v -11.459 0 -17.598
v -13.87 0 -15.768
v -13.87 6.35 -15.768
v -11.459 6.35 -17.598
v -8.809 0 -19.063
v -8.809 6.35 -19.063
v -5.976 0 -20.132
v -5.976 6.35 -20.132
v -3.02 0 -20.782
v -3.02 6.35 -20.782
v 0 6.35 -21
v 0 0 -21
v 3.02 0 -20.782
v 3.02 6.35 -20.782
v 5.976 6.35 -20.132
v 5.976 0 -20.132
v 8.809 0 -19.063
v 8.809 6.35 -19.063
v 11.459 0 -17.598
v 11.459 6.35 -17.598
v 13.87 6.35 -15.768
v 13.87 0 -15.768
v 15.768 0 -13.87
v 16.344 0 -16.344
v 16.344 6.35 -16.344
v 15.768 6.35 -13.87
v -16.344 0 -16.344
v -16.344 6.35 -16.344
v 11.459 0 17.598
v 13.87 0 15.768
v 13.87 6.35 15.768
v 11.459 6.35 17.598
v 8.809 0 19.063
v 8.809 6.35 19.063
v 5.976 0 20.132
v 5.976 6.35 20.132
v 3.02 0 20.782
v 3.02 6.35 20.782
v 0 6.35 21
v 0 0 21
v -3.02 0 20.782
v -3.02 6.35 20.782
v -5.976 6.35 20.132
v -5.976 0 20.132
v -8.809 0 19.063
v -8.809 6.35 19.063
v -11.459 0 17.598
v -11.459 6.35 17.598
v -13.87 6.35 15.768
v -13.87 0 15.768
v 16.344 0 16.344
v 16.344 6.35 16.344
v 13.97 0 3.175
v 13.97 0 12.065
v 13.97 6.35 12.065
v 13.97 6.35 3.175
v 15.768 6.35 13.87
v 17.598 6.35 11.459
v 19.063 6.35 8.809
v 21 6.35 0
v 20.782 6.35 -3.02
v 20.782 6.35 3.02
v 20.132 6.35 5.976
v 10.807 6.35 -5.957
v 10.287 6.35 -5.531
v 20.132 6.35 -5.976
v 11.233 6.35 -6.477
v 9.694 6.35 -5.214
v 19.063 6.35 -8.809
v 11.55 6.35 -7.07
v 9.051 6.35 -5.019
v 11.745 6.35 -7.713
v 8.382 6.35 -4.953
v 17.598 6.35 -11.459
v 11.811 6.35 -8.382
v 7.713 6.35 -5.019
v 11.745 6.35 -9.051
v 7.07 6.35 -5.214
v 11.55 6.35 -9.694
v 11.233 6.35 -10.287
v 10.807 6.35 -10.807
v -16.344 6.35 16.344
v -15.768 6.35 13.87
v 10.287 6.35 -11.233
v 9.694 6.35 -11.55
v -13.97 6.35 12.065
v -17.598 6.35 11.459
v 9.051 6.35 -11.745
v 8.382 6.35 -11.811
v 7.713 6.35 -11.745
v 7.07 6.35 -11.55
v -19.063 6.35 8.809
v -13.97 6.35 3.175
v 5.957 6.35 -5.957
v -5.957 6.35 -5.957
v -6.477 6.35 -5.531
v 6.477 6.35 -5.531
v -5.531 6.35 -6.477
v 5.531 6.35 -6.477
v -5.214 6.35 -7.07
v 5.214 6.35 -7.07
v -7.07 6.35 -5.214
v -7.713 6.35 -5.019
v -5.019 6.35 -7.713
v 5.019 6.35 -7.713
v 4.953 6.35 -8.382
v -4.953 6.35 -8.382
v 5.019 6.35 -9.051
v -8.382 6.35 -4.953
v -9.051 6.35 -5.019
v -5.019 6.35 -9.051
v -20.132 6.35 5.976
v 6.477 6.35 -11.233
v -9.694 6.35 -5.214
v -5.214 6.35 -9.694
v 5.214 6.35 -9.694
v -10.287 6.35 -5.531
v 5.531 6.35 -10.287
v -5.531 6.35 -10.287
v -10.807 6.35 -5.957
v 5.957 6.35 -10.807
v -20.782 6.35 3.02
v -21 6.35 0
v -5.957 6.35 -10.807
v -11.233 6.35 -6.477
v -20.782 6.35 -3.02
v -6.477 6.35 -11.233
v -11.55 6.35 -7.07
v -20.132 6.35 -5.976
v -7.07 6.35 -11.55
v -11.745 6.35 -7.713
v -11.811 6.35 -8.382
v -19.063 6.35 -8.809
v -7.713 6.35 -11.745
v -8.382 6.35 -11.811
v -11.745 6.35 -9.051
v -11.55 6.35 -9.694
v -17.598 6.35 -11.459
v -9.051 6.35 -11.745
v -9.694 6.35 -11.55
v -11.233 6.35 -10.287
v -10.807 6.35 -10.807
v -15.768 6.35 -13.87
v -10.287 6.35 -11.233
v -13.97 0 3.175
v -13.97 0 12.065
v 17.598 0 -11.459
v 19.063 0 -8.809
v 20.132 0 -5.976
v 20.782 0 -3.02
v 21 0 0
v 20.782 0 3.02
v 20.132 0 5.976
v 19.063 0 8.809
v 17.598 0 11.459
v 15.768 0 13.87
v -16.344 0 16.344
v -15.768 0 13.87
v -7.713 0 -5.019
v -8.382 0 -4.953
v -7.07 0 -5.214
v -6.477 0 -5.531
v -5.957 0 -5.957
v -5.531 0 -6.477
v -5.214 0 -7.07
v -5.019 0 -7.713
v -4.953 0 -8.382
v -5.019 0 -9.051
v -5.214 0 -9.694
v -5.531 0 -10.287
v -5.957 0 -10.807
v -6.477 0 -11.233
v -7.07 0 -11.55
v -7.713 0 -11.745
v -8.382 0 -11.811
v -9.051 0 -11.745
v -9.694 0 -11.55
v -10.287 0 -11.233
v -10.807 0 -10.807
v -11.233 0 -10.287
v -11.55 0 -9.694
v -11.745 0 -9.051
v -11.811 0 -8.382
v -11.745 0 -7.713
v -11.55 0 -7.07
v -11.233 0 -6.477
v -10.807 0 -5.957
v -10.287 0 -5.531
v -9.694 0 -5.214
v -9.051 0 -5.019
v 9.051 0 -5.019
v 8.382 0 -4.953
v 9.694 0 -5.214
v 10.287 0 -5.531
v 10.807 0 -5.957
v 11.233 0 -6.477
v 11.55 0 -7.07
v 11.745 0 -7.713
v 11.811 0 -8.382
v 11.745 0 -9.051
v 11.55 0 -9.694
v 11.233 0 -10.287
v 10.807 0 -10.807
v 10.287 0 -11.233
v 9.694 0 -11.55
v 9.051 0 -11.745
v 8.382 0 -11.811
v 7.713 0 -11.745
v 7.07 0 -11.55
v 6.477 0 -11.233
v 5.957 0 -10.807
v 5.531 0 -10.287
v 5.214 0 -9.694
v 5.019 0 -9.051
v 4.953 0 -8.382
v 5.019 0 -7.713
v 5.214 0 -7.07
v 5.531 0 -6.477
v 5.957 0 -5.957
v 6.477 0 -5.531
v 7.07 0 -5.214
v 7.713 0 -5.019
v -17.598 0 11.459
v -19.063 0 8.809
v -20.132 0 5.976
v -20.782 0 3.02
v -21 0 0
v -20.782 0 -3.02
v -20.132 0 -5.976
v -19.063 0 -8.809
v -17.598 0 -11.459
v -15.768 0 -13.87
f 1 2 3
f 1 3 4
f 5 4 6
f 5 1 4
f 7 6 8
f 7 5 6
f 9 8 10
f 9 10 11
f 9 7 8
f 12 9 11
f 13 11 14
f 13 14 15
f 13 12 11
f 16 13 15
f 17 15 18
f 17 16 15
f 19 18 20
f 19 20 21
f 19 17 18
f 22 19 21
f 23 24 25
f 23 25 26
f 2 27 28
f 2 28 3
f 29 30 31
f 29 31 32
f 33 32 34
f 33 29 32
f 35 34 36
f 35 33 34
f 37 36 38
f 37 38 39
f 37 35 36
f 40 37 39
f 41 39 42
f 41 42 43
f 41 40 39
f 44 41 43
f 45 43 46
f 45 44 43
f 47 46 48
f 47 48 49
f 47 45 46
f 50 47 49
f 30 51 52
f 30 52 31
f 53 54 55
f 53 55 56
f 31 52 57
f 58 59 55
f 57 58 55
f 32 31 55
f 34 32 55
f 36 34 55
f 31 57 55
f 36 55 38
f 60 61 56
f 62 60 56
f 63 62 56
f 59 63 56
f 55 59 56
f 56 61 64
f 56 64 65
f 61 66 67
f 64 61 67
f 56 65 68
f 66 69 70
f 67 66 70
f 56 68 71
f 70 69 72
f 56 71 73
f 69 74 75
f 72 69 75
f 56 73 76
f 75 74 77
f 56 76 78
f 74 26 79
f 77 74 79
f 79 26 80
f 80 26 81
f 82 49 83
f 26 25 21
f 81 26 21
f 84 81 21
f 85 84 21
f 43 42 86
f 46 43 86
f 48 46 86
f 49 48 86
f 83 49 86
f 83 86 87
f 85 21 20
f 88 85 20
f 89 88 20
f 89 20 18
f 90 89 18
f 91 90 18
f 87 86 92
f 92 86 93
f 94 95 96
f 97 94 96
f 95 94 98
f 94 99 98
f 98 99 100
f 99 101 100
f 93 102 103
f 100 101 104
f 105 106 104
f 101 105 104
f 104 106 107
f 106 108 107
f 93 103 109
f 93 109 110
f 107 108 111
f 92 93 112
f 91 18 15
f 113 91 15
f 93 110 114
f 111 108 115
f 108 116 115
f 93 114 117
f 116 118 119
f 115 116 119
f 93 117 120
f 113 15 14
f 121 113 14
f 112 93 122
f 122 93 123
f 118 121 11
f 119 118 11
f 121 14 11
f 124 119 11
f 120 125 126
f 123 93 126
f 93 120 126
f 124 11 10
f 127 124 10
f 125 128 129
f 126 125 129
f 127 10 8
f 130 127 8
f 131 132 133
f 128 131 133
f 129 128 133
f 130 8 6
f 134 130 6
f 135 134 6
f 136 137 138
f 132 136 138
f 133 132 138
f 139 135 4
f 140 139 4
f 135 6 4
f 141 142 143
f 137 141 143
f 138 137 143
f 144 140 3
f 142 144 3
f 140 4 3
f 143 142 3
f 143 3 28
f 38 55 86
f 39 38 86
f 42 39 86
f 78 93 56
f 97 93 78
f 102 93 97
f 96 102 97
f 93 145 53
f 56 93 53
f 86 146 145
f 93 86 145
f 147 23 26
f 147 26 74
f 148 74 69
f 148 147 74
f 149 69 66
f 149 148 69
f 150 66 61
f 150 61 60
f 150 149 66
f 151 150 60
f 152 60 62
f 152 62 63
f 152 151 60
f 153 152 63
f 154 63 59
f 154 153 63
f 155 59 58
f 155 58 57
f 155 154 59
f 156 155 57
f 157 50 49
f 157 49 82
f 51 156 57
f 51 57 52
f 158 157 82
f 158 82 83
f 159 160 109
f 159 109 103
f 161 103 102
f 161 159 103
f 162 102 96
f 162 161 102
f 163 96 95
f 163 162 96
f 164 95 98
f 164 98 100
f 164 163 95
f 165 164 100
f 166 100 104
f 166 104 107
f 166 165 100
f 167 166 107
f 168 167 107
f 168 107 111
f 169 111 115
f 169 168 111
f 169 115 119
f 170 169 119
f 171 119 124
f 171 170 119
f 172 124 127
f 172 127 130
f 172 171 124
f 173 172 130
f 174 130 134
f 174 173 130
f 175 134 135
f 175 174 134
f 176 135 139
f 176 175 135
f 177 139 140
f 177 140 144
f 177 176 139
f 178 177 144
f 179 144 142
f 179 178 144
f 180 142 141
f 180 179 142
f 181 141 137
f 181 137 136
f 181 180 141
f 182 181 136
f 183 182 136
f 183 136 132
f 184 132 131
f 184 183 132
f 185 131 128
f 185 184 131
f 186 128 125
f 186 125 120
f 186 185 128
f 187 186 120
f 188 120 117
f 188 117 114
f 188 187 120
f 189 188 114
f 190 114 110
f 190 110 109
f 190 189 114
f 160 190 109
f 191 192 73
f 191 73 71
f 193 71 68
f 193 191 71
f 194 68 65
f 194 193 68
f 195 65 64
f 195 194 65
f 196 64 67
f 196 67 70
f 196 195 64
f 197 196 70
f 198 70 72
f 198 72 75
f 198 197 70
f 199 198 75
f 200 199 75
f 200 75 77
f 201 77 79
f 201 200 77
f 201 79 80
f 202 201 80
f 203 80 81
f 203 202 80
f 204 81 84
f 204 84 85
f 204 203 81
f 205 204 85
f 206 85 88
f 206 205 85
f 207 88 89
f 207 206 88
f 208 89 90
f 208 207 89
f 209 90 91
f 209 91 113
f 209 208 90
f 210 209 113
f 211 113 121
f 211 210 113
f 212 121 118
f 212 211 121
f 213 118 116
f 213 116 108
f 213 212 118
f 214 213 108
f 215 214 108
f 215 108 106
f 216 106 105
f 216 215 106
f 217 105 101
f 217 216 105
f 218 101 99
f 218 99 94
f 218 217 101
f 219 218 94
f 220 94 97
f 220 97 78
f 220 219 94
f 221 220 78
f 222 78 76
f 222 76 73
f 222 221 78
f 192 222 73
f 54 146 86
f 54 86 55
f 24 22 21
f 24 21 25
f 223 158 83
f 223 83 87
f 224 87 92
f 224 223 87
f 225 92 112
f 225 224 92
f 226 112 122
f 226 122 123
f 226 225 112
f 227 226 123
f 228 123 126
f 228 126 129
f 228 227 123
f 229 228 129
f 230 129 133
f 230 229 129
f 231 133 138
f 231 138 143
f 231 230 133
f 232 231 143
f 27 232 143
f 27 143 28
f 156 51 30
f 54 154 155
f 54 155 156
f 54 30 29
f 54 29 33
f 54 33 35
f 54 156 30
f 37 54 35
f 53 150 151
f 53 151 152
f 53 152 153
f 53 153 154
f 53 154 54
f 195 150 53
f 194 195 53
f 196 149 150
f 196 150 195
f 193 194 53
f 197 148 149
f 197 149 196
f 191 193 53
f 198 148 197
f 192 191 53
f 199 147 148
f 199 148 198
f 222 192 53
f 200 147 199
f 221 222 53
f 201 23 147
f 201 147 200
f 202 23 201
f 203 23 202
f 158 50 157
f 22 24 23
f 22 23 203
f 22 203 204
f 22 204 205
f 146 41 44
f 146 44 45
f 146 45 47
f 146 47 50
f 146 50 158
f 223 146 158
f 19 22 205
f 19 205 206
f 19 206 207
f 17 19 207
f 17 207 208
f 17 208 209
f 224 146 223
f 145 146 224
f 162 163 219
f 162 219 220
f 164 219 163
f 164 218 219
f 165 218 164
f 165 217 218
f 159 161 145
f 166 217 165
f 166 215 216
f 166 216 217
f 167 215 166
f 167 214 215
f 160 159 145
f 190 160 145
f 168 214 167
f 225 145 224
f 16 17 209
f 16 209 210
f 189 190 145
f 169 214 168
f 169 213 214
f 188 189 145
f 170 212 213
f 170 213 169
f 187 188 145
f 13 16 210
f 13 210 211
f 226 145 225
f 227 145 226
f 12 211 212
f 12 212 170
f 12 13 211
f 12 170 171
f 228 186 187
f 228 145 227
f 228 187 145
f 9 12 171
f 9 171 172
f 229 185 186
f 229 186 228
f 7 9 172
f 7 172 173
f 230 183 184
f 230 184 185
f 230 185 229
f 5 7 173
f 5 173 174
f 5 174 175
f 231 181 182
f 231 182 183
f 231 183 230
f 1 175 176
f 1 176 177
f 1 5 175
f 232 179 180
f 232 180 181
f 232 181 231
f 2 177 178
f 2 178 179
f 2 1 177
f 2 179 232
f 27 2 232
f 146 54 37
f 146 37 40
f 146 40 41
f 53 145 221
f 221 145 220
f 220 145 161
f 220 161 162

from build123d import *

# Parameters (mm, degrees)
SKETCH1_R           = 3.429
SKETCH1_W           = 27.94
SKETCH1_H           = 8.89
BOSS_EXTRUDE1_DEPTH = 6.35


with BuildPart() as part:
    # Sketch1 → Boss-Extrude1 (new body)
    with BuildSketch(Plane(origin=(0, 0, 0), x_dir=(1, 0, 0), z_dir=(0, 1, 0))):
        with BuildLine():
            Line((13.870085237, 15.767711804), (16.343875029, 16.343875029))
            Line((16.343875029, 16.343875029), (15.767711804, 13.870085237))
            ThreePointArc((15.767711804, 13.870085237), (21, 0), (15.767711804, -13.870085237))
            Line((15.767711804, -13.870085237), (16.343875029, -16.343875029))
            Line((16.343875029, -16.343875029), (13.870085237, -15.767711804))
            ThreePointArc((13.870085237, -15.767711804), (0, -21), (-13.870085237, -15.767711804))
            Line((-13.870085237, -15.767711804), (-16.343875029, -16.343875029))
            Line((-16.343875029, -16.343875029), (-15.767711804, -13.870085237))
            ThreePointArc((-15.767711804, -13.870085237), (-21, 0), (-15.767711804, 13.870085237))
            Line((-15.767711804, 13.870085237), (-16.343875029, 16.343875029))
            Line((-16.343875029, 16.343875029), (-13.870085237, 15.767711804))
            ThreePointArc((-13.870085237, 15.767711804), (0, 21), (13.870085237, 15.767711804))
        make_face()
        with Locations(Location((-8.382, 8.382, 0), (0, 0, 270))):
            Circle(SKETCH1_R, mode=Mode.SUBTRACT)
        with Locations(Location((8.382, 8.382, 0), (0, 0, 270))):
            Circle(SKETCH1_R, mode=Mode.SUBTRACT)
        with Locations((0, -7.62)):
            Rectangle(SKETCH1_W, SKETCH1_H, mode=Mode.SUBTRACT)
    extrude(amount=BOSS_EXTRUDE1_DEPTH)


solid = part.part
